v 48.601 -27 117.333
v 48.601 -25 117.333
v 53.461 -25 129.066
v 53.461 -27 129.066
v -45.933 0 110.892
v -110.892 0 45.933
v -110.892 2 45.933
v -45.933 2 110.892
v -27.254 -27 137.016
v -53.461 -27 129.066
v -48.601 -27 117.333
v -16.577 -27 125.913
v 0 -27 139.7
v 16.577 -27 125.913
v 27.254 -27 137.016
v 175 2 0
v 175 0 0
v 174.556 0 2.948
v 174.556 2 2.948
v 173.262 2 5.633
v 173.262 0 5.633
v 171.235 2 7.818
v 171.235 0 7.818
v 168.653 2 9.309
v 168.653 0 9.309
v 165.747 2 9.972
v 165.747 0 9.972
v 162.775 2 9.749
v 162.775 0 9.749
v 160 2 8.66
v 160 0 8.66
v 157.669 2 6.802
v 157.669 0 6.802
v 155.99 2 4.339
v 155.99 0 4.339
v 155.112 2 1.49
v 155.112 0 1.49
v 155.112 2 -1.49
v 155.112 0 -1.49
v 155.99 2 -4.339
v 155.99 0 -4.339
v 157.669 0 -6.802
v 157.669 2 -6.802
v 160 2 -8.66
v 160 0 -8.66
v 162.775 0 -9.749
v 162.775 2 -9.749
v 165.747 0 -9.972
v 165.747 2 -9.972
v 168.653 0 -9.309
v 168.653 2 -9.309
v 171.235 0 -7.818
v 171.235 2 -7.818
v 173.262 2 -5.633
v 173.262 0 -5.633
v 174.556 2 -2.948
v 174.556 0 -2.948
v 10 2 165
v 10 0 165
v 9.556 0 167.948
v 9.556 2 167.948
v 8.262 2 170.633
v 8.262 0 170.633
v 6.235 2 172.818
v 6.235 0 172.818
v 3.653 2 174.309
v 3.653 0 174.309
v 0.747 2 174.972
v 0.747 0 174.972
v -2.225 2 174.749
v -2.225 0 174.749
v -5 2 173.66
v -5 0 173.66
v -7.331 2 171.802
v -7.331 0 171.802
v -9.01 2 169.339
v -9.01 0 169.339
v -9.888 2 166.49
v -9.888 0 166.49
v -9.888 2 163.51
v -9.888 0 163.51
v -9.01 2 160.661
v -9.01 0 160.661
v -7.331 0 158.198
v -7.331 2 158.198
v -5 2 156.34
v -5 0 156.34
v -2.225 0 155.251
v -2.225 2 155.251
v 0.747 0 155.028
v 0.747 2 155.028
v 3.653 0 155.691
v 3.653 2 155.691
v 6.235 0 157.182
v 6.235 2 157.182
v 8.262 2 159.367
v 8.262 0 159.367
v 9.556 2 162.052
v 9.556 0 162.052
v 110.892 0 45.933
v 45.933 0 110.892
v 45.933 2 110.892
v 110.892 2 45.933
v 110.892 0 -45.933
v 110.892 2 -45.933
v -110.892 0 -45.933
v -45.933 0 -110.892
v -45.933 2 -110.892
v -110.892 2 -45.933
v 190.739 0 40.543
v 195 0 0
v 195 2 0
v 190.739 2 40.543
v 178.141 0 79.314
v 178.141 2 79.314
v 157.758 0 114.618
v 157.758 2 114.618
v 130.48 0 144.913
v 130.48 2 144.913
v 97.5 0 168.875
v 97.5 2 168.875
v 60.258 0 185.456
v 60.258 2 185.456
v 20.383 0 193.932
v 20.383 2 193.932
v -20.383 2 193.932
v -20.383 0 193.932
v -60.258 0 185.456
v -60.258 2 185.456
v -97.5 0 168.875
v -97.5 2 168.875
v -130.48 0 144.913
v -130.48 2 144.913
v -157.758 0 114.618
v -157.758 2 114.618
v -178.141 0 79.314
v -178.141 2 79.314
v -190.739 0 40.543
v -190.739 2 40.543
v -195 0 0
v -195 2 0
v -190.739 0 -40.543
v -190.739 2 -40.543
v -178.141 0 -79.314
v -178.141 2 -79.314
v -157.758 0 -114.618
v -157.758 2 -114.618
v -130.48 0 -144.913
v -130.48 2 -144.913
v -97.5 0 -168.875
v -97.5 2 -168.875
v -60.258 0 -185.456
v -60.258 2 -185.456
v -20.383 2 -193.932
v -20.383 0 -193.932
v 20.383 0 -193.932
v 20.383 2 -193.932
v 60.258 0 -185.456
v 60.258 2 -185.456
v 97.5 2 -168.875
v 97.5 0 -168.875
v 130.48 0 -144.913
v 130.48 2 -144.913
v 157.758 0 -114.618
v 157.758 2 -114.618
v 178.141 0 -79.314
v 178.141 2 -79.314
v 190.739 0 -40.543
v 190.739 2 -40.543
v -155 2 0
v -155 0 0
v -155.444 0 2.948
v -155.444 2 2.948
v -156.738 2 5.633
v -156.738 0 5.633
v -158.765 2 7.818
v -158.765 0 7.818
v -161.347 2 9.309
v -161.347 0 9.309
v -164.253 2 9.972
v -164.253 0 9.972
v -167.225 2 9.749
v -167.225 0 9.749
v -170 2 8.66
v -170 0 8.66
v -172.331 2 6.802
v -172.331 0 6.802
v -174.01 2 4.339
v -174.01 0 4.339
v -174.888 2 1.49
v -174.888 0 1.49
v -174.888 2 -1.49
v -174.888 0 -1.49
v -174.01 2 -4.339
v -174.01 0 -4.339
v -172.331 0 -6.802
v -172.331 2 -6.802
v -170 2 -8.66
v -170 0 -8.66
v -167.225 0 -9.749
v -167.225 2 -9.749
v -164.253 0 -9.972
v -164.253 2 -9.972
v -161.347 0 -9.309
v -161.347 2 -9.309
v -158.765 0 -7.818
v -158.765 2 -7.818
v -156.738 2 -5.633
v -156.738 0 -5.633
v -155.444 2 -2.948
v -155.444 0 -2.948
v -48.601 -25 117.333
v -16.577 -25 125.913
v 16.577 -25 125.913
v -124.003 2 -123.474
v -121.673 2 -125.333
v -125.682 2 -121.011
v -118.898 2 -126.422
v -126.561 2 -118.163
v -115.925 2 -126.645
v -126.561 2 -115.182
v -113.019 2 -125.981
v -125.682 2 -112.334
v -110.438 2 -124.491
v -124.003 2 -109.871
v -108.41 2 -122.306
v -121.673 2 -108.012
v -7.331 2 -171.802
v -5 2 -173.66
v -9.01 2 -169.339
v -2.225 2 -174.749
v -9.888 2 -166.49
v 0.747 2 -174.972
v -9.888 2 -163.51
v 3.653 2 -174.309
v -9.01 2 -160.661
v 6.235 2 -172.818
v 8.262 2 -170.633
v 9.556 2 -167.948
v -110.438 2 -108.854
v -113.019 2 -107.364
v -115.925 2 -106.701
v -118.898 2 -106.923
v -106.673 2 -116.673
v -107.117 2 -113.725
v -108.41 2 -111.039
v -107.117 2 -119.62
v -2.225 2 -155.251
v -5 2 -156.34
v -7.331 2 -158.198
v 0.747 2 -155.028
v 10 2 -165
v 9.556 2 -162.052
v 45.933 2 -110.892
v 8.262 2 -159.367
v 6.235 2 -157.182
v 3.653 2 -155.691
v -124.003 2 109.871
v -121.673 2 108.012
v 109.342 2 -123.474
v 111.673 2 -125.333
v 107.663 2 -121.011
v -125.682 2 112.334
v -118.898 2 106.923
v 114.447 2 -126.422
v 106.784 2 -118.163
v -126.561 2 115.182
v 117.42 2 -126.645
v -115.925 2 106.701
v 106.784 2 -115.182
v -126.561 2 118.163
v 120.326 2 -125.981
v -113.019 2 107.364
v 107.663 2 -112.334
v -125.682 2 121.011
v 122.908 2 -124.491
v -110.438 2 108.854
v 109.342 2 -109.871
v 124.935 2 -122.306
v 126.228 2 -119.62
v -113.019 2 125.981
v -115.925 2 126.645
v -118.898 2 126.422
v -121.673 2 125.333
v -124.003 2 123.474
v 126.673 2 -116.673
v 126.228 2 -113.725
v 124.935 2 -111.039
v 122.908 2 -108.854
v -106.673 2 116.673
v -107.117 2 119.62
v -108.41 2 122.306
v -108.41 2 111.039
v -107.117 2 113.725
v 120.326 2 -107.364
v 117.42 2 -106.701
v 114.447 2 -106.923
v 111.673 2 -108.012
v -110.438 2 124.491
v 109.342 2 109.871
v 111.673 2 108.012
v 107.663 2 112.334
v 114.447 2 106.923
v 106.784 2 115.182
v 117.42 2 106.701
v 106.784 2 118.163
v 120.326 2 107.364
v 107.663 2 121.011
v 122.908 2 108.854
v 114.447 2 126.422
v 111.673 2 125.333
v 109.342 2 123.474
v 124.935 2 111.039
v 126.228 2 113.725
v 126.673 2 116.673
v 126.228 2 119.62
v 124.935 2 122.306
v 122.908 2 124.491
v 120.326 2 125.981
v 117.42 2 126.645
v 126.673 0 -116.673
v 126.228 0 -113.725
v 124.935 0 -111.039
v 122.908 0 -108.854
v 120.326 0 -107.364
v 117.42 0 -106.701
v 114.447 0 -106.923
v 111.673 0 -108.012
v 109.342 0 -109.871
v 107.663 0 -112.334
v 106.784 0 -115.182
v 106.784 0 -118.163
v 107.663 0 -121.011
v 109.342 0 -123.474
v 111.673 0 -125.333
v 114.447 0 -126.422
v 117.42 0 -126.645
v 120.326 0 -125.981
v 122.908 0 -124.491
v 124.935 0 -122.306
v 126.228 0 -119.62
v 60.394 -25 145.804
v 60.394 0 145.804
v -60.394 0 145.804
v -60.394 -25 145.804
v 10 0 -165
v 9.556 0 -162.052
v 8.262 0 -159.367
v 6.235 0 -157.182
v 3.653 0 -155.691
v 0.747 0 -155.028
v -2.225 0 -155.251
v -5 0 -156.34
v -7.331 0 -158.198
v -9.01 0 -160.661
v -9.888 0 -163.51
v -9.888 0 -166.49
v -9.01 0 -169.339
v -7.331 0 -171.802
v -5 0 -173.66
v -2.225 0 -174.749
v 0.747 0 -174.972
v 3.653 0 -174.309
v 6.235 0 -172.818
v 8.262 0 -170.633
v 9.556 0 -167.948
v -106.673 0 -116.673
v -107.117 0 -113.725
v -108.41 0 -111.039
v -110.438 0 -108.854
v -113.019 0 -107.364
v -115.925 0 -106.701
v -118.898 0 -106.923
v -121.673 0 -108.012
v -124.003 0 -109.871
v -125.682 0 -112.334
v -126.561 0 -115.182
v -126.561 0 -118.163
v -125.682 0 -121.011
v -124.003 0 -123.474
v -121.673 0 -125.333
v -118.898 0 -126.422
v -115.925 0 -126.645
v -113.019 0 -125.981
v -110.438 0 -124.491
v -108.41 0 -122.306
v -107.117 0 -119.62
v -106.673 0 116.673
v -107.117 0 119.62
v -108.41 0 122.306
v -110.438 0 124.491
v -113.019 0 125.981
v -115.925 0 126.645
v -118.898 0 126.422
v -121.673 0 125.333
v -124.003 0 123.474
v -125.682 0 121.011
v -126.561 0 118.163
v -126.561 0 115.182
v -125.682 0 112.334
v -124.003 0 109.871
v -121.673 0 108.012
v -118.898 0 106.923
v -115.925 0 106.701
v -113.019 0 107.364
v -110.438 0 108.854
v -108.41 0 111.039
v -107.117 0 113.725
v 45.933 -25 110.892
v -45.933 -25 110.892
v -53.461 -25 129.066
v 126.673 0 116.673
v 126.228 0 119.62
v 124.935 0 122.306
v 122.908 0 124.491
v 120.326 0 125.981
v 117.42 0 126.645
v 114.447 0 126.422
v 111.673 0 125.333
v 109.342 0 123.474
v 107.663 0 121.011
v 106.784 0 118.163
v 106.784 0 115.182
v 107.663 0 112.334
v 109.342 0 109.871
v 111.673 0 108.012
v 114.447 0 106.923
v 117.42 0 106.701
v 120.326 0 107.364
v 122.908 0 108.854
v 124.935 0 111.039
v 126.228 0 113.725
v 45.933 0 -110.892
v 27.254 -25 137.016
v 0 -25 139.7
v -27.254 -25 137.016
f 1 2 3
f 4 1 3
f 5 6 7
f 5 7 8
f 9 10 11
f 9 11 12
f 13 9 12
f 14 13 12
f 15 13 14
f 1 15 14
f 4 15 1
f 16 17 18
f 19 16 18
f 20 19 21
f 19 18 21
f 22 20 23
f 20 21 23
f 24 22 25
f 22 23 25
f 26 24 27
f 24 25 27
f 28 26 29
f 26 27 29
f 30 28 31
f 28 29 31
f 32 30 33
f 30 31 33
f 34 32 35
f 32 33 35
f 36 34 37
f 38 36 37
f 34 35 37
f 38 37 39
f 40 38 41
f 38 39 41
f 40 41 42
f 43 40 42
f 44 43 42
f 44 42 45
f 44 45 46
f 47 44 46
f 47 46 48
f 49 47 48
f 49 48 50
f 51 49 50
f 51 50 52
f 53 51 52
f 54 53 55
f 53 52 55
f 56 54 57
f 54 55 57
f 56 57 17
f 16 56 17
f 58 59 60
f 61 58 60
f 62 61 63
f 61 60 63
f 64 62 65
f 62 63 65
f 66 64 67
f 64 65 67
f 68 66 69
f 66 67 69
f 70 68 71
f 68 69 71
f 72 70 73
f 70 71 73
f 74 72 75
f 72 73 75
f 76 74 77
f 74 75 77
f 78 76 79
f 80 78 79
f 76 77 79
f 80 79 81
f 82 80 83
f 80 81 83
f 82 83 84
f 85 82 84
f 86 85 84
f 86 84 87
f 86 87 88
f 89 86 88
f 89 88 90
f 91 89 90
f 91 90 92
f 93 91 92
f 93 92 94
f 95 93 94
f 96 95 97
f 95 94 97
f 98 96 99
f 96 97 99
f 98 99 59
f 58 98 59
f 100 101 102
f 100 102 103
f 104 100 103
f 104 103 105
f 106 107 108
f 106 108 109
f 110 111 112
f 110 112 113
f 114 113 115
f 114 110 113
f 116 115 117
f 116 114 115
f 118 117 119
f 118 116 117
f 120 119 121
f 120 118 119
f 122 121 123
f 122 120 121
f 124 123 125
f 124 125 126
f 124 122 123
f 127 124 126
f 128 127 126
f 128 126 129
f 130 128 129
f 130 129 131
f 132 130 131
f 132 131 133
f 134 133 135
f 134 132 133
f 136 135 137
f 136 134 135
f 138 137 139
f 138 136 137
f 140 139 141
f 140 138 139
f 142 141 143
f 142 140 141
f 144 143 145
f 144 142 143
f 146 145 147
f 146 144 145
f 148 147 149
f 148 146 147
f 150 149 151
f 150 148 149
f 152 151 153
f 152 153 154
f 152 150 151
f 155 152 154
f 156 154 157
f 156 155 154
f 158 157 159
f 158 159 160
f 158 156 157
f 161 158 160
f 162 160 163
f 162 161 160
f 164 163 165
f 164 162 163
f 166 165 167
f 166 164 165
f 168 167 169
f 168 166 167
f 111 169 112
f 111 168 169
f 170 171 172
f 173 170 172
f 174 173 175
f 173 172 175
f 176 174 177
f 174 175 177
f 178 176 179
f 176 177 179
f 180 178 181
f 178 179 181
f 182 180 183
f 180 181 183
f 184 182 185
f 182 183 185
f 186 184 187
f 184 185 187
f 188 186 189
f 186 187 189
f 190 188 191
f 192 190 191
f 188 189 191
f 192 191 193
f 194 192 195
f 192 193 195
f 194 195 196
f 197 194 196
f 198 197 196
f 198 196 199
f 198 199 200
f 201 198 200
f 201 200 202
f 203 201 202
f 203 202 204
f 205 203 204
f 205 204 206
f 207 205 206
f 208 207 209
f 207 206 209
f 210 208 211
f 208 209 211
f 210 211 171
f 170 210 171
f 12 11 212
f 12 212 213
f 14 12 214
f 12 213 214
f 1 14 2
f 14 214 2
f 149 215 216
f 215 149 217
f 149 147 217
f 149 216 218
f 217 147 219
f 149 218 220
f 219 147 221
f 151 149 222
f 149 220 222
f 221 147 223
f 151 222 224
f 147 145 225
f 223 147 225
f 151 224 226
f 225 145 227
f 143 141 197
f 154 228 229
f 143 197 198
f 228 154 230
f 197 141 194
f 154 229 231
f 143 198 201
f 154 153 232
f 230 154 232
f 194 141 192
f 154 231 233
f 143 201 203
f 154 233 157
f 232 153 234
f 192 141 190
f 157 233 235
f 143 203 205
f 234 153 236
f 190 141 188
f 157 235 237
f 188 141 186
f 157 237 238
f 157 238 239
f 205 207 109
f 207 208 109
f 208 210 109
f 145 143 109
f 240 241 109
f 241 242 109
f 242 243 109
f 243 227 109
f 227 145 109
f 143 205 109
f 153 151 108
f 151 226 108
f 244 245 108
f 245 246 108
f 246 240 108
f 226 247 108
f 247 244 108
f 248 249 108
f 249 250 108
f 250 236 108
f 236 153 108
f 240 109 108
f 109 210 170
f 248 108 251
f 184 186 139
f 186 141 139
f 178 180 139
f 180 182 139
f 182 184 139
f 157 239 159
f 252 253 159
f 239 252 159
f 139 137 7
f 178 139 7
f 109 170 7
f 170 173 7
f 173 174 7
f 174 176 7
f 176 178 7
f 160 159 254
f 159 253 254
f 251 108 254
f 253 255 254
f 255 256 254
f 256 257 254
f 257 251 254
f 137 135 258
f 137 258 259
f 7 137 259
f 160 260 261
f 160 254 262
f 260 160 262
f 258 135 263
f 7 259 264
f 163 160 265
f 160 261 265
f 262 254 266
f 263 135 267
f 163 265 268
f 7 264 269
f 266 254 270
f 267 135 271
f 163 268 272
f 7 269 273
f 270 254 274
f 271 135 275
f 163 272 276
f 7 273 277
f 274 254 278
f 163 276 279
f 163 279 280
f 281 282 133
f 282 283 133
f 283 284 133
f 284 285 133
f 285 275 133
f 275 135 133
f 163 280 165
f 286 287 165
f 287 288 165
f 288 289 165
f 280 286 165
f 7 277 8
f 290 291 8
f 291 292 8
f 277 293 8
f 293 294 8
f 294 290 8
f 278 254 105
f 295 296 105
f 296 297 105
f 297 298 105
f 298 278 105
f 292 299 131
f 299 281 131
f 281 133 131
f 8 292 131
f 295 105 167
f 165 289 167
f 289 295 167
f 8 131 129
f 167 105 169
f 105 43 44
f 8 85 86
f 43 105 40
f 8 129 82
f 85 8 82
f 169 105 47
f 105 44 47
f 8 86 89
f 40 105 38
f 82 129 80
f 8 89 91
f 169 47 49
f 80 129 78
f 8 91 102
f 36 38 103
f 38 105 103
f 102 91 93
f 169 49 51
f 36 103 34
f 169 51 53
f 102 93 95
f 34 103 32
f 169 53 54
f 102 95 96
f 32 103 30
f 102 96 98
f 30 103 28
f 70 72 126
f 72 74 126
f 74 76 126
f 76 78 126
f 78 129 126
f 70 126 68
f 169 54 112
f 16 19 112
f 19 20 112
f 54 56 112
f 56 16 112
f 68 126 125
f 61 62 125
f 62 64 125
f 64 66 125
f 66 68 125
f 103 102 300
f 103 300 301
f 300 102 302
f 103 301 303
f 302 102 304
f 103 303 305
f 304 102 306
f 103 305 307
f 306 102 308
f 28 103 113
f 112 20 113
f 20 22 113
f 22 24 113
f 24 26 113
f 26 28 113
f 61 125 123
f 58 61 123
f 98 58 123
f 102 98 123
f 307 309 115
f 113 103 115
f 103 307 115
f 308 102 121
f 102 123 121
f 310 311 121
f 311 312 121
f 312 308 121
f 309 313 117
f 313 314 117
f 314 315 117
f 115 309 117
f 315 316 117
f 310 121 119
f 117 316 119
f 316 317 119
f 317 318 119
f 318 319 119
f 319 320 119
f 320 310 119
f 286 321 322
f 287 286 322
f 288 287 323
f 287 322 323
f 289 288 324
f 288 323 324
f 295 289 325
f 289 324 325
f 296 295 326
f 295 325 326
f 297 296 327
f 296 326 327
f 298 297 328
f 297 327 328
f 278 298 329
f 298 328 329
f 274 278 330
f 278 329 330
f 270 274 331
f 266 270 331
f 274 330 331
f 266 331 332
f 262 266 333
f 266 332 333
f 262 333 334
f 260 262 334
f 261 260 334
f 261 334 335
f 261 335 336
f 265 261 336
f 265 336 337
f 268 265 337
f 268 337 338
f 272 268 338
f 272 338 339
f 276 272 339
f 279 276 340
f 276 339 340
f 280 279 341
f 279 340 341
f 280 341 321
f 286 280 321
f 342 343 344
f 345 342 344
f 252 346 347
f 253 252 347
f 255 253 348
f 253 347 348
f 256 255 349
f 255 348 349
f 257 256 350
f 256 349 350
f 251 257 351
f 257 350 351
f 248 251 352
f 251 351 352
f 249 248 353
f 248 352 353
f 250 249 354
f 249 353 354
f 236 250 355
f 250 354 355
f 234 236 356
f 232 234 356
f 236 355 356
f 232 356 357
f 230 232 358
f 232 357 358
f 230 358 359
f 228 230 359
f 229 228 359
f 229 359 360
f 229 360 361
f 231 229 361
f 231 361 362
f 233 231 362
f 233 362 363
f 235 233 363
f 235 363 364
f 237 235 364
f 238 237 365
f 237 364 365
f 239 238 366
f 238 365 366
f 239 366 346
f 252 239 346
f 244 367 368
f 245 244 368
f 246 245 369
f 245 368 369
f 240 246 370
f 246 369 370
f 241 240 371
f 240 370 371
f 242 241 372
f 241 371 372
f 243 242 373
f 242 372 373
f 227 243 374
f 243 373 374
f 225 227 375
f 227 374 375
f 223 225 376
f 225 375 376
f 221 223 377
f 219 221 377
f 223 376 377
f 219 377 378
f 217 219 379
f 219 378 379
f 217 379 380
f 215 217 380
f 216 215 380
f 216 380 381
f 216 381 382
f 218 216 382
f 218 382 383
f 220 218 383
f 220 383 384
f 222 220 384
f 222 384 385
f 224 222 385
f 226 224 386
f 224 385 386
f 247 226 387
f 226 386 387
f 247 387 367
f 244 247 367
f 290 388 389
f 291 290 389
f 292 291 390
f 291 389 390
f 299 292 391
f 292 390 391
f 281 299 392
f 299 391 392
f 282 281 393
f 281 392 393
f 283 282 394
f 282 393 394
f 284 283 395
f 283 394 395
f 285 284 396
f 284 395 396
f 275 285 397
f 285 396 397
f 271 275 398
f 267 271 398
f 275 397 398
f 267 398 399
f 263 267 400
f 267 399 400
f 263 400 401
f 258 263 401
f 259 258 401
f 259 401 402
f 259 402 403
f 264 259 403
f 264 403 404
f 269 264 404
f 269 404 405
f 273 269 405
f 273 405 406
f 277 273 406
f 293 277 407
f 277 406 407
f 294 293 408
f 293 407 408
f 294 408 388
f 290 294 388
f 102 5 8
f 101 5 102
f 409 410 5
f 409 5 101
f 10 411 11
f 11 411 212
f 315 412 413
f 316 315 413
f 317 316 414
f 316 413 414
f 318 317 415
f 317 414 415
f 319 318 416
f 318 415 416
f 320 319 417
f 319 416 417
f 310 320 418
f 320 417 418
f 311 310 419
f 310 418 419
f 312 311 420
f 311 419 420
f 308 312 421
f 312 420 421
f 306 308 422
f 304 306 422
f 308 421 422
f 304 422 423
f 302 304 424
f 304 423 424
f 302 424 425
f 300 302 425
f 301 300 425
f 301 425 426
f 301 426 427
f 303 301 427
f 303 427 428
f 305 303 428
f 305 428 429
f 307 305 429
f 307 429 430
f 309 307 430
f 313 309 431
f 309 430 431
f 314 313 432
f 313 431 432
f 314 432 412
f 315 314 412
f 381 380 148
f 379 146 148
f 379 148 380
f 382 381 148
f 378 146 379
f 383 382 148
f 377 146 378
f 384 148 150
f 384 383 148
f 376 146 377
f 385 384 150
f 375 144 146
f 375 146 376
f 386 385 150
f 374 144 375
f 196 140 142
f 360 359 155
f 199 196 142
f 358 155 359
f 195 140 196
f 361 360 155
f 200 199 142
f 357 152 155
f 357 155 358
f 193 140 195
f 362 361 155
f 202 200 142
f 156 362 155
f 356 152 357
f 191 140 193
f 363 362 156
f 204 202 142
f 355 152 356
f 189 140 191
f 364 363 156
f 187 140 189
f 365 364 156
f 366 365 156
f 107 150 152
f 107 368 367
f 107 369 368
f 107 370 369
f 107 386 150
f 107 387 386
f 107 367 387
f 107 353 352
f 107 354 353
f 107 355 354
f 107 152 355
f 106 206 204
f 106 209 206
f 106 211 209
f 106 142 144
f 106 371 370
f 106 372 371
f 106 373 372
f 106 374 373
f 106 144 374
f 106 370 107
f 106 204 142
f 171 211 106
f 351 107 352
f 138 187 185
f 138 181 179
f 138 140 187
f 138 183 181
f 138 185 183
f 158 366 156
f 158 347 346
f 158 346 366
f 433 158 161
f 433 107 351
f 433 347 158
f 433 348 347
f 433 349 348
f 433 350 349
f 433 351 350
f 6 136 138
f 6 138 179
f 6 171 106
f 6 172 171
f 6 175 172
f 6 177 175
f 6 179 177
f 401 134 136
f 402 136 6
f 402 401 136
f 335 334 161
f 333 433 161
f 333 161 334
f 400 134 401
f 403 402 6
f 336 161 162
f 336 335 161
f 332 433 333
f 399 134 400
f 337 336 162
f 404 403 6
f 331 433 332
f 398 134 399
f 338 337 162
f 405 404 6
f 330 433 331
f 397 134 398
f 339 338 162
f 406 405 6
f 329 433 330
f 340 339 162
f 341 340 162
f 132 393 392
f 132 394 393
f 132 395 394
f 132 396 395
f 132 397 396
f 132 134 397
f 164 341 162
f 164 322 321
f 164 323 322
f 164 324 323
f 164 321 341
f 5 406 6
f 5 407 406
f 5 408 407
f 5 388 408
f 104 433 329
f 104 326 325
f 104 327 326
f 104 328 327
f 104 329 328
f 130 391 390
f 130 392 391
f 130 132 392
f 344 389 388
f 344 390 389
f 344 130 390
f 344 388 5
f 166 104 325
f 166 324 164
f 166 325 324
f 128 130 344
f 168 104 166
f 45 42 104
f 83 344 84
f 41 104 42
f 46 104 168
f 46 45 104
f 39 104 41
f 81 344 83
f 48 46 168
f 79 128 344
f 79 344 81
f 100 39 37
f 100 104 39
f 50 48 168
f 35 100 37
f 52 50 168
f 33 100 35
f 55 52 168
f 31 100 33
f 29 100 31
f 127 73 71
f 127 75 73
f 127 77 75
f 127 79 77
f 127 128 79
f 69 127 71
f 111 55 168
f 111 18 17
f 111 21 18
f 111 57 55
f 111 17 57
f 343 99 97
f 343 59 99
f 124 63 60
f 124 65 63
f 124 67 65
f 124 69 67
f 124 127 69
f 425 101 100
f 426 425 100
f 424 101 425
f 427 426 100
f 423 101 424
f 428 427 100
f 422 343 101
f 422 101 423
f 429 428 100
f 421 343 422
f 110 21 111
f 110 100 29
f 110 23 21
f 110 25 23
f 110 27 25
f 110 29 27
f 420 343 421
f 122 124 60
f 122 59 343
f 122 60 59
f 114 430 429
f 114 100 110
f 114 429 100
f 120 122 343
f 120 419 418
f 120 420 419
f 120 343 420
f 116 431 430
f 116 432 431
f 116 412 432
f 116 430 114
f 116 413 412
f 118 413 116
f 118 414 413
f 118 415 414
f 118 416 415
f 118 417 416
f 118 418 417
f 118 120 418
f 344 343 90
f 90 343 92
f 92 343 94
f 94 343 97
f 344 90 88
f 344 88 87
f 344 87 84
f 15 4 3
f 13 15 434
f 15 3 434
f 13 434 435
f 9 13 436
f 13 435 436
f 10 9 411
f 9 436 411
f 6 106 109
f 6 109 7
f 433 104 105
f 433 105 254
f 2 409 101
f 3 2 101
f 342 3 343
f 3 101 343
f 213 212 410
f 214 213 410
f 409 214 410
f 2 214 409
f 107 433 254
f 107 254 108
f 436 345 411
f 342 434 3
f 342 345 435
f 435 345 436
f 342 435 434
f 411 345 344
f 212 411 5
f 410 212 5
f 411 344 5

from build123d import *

# Parameters (mm, degrees)
F1_DEPTH = 25
F3_DEPTH = 2
F4_R     = 195
F4_R_2   = 10
F5_DEPTH = 2


with BuildPart() as f1:
    # F0 (on Front) → F1 (new body)
    with BuildSketch(Plane.XZ):
        Polygon((-60.394094, 145.804241), (-45.933053, 110.892201), (45.933053, 110.892201), (60.394094, 145.804241), align=None)
    extrude(amount=F1_DEPTH)

    # F2 (on face) → F3 (join)
    with BuildSketch(Plane.XZ.offset(25)):
        with BuildLine():
            Line((-53.460876, 129.065971), (-48.600796, 117.332701))
            ThreePointArc((-48.600796, 117.332701), (0, 127), (48.600796, 117.332701))
            Line((48.600796, 117.332701), (53.460876, 129.065971))
            ThreePointArc((53.460876, 129.065971), (0, 139.7), (-53.460876, 129.065971))
        make_face()
    extrude(amount=F3_DEPTH)

    # F4 (on face) → F5 (join)
    with BuildSketch(Plane.XZ):
        Circle(F4_R)
        with Locations((-116.672619, -116.672619)):
            Circle(F4_R_2, mode=Mode.SUBTRACT)
        with Locations((0, -165)):
            Circle(F4_R_2, mode=Mode.SUBTRACT)
        with Locations((116.672619, -116.672619)):
            Circle(F4_R_2, mode=Mode.SUBTRACT)
        with Locations((-165, 0)):
            Circle(F4_R_2, mode=Mode.SUBTRACT)
        with Locations((-116.672619, 116.672619)):
            Circle(F4_R_2, mode=Mode.SUBTRACT)
        Polygon((-110.892201, -45.933053), (-110.892201, 45.933053), (-45.933053, 110.892201), (45.933053, 110.892201), (110.892201, 45.933053), (110.892201, -45.933053), (45.933053, -110.892201), (-45.933053, -110.892201), align=None, mode=Mode.SUBTRACT)
        with Locations((165, 0)):
            Circle(F4_R_2, mode=Mode.SUBTRACT)
        with Locations((0, 165)):
            Circle(F4_R_2, mode=Mode.SUBTRACT)
        with Locations((116.672619, 116.672619)):
            Circle(F4_R_2, mode=Mode.SUBTRACT)
    extrude(amount=-F5_DEPTH)


solid = f1.part
